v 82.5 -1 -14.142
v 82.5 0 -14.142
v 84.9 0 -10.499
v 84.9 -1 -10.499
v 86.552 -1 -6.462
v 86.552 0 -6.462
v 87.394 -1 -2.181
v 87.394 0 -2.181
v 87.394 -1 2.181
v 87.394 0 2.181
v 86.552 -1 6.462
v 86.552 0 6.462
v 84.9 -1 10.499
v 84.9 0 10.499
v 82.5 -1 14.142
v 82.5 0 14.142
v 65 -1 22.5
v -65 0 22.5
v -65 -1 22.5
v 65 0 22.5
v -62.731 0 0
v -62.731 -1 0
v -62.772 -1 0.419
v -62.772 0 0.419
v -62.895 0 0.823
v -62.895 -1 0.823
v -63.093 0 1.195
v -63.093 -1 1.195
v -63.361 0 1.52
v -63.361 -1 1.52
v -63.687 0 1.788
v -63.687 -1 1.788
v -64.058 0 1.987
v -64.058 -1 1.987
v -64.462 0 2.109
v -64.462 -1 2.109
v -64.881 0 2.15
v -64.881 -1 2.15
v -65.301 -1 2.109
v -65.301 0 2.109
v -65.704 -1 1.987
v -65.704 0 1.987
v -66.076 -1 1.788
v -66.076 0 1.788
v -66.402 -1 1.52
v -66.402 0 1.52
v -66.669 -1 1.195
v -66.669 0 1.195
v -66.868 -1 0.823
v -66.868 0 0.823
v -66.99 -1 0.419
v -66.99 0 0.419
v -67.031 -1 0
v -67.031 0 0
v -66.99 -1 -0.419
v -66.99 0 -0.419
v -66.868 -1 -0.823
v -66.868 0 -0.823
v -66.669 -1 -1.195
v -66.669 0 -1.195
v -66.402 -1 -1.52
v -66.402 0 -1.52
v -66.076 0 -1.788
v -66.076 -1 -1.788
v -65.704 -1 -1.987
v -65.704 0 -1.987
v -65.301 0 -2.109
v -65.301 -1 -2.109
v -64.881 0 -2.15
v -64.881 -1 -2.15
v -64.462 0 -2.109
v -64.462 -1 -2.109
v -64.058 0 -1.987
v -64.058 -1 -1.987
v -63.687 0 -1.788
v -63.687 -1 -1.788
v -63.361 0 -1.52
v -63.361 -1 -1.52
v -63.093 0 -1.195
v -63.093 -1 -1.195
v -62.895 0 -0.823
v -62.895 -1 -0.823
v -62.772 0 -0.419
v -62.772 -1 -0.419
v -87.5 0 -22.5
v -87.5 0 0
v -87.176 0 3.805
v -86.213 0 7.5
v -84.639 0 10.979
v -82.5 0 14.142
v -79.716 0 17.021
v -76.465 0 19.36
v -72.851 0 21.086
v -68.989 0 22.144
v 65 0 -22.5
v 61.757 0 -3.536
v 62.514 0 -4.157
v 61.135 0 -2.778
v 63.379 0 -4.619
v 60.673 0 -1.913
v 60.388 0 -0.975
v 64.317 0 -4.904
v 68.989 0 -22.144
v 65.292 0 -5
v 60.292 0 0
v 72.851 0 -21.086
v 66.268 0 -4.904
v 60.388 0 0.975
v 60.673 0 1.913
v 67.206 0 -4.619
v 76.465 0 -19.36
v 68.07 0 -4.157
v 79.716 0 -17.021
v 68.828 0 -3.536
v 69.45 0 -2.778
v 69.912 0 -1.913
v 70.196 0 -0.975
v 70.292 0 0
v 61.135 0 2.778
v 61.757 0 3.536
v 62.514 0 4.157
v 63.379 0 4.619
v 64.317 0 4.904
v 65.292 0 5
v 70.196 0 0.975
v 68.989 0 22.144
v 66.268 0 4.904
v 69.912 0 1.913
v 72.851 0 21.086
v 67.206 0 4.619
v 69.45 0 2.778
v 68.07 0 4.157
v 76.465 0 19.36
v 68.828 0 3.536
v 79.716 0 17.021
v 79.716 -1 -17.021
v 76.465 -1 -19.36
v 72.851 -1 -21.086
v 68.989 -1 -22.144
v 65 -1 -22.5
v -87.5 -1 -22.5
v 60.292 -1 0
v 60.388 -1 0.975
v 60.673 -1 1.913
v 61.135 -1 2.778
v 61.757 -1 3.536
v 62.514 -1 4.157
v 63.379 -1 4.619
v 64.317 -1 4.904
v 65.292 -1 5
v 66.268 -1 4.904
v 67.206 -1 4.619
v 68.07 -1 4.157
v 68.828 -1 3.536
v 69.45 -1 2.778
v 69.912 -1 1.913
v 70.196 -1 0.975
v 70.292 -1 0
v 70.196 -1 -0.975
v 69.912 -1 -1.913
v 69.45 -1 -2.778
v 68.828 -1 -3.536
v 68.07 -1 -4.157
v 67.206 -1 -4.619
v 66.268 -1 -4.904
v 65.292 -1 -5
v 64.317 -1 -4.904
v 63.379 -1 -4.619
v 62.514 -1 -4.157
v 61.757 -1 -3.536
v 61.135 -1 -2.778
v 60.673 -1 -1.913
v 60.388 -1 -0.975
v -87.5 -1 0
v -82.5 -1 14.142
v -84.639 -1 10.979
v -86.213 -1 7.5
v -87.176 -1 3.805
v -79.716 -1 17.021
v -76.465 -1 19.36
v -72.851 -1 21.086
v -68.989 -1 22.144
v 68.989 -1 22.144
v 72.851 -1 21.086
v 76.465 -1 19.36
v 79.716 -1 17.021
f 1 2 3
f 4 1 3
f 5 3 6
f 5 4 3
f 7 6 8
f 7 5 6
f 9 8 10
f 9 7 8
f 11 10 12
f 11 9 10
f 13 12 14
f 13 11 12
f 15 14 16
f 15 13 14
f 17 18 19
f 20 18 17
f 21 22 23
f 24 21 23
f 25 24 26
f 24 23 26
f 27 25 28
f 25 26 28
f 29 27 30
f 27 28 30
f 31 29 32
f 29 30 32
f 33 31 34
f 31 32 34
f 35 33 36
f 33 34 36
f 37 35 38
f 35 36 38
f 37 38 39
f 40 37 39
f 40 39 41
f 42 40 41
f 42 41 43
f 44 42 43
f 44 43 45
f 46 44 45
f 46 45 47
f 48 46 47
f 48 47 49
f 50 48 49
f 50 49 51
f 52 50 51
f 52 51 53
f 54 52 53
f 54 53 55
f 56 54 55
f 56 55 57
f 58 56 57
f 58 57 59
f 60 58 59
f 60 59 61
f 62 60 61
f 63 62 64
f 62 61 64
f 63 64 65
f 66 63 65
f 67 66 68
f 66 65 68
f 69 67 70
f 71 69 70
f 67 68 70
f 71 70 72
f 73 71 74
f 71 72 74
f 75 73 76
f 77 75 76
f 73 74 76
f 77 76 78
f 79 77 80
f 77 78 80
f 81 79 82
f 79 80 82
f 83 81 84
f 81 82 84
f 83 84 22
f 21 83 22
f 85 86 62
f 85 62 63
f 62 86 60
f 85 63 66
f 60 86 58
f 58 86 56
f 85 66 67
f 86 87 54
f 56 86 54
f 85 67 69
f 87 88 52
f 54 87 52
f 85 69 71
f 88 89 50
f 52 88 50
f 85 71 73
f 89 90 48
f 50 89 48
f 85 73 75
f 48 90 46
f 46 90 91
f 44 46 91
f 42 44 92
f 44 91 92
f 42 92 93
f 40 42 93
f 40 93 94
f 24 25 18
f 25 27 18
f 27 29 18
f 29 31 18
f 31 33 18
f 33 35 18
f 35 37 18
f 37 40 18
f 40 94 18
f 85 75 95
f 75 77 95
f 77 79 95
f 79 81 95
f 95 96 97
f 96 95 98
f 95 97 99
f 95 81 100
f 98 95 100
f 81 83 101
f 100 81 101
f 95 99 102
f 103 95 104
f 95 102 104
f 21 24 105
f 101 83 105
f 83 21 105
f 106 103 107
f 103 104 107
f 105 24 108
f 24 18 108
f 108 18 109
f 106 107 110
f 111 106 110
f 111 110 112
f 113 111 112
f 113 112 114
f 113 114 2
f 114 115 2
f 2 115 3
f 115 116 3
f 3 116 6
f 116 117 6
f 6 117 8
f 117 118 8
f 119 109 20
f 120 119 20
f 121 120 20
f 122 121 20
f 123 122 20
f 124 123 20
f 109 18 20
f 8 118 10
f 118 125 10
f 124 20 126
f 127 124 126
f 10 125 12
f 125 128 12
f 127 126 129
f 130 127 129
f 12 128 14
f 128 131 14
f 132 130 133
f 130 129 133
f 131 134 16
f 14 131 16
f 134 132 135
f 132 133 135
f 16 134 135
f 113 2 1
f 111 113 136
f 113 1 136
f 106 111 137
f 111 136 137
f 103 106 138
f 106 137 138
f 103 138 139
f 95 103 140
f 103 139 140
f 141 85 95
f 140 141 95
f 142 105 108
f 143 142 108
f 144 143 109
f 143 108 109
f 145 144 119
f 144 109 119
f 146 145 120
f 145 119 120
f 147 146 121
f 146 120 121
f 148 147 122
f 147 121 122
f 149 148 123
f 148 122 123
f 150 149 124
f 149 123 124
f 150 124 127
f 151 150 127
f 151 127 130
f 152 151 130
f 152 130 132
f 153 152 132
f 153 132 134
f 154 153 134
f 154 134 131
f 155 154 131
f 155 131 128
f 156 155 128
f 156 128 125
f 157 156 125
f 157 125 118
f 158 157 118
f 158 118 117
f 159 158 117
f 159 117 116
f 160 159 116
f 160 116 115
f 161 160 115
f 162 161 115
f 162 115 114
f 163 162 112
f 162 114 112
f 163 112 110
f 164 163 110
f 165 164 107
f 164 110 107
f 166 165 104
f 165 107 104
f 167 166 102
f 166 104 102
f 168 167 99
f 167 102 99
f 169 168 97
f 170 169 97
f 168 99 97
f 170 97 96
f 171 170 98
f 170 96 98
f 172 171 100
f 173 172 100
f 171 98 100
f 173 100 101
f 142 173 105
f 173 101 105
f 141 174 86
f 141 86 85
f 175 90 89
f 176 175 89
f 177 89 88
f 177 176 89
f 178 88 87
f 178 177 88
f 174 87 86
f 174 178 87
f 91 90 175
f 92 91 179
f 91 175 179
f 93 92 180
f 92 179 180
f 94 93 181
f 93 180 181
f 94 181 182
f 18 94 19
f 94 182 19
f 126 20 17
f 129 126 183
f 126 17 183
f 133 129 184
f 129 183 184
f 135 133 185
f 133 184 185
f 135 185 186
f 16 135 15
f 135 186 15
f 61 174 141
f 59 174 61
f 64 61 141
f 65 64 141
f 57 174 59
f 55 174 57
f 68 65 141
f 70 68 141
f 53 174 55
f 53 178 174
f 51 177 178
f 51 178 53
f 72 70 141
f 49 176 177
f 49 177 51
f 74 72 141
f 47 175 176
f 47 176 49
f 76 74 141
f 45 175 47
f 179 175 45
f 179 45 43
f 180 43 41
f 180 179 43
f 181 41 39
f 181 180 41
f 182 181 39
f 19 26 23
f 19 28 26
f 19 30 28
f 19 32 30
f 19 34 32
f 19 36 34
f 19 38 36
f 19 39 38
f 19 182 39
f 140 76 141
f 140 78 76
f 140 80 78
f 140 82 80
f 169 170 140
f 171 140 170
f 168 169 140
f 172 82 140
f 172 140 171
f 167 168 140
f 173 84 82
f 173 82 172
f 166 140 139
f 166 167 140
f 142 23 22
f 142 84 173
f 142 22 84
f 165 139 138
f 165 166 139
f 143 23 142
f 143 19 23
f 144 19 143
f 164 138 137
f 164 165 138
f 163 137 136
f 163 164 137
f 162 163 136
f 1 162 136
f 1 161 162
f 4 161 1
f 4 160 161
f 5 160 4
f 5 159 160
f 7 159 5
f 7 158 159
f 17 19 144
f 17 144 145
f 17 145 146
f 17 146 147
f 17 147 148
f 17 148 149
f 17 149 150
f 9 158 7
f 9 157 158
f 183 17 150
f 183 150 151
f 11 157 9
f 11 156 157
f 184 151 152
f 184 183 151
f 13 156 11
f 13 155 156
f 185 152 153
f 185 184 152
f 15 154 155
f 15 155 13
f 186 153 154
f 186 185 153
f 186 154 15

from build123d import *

# Parameters (mm, degrees)
F0_W      = 165
F0_H      = 45
F0_R      = 12.5
F1_DEPTH  = 1
F3_DEPTH  = 1
F4_DEPTH  = 25
F5_DEPTH  = 25
F8_DEPTH  = 1
F9_W      = 35.9933748841
F9_H      = 31.3726086169
F9_W_2    = 33.6829945445
F9_H_2    = 28.8190245628
F10_DEPTH = 1
F11_R     = 4.1249872097
F12_DEPTH = 25
F13_R     = 2.1502393586
F14_DEPTH = 25
F15_R     = 5
F16_DEPTH = 25


with BuildPart() as f1:
    # F0 (on Front) → F1 (new body)
    with BuildSketch(Plane.XZ):
        Rectangle(F0_W, F0_H)
        with Locations((-65, 0)):
            Circle(F0_R, mode=Mode.SUBTRACT)
        with Locations((65, 0)):
            Circle(F0_R, mode=Mode.SUBTRACT)
    extrude(amount=F1_DEPTH)

    # F2 (on face) → F3 (join)
    with BuildSketch(Plane.XZ.offset(1)):
        with BuildLine():
            Line((68.3925151825, -19.0988145769), (65, -22.5))
            ThreePointArc((65, -22.5), (87.5, 0), (65, 22.5))
            Line((65, 22.5), (71.474224329, 16.2770561874))
            Line((71.474224329, 16.2770561874), (77.4062722921, 9.1145541519))
            Line((77.4062722921, 9.1145541519), (80.3926512599, 2.1407562308))
            Line((80.3926512599, 2.1407562308), (80.3926512599, -5.2317115478))
            Line((80.3926512599, -5.2317115478), (78.3914923668, -12.1520543471))
            Line((78.3914923668, -12.1520543471), (74.6632069349, -14.4081749022))
            Line((74.6632069349, -14.4081749022), (68.3925151825, -19.0988145769))
        make_face()
        with BuildLine():
            Line((-65, 14.9617949501), (-65, 22.5))
            ThreePointArc((-65, 22.5), (-87.5, 0), (-65, -22.5))
            Line((-65, -22.5), (-67.4760043621, -15.6979020685))
            Line((-67.4760043621, -15.6979020685), (-72.8440880775, -12.9142012447))
            Line((-72.8440880775, -12.9142012447), (-76.5851810575, -7.8018400818))
            Line((-76.5851810575, -7.8018400818), (-79.5639529824, 0))
            Line((-79.5639529824, 0), (-79.5639529824, 6.4657721668))
            Line((-79.5639529824, 6.4657721668), (-75.4495188594, 11.7608513683))
            Line((-75.4495188594, 11.7608513683), (-65, 14.9617949501))
        make_face()
    extrude(amount=-F3_DEPTH)

    # F2 (on face) → F4 (cut)
    with BuildSketch(Plane.XZ.offset(1)):
        with BuildLine():
            Line((-82.5, 22.5), (-82.5, 14.1421356237))
            ThreePointArc((-82.5, 14.1421356237), (-74.6966991411, 20.3033008589), (-65, 22.5))
            Line((-65, 22.5), (-82.5, 22.5))
        make_face()
    extrude(amount=-F4_DEPTH, mode=Mode.SUBTRACT)

    # F2 (on face) → F5 (cut)
    with BuildSketch(Plane.XZ.offset(1)):
        with BuildLine():
            ThreePointArc((82.5, -14.1421356237), (74.6966991411, -20.3033008589), (65, -22.5))
            Line((65, -22.5), (82.5, -22.5))
            Line((82.5, -22.5), (82.5, -14.1421356237))
        make_face()
        with BuildLine():
            ThreePointArc((65, 22.5), (74.6966991411, 20.3033008589), (82.5, 14.1421356237))
            Line((82.5, 14.1421356237), (82.5, 22.5))
            Line((82.5, 22.5), (65, 22.5))
        make_face()
        with BuildLine():
            Line((-82.5, -22.5), (-65, -22.5))
            ThreePointArc((-65, -22.5), (-74.6966991411, -20.3033008589), (-82.5, -14.1421356237))
            Line((-82.5, -14.1421356237), (-82.5, -22.5))
        make_face()
    extrude(amount=-F5_DEPTH, mode=Mode.SUBTRACT)

    # F7 (on face) → F8 (join)
    with BuildSketch(Plane.XZ.offset(1)):
        Polygon((-81.9395110011, 0), (-87.5, 0), (-87.5, -22.5), (-65, -22.5), (-65, -18.5897927731), (-73.3228996396, -16.0001199692), (-80.1934376359, -9.6208481118), align=None)
    extrude(amount=-F8_DEPTH)

    # F9 (on face) → F10 (join)
    with BuildSketch(Plane.XZ.offset(1)):
        with Locations((-60.8671866357, 0.5391770974)):
            Rectangle(F9_W, F9_H)
        with Locations((63.7112520635, 0.1135794446)):
            Rectangle(F9_W_2, F9_H_2)
    extrude(amount=-F10_DEPTH)

    # F11 (on face) → F12 (cut)
    with BuildSketch(Plane.XZ.offset(1)):
        with Locations((65.292224288, 0)):
            Circle(F11_R)
    extrude(amount=-F12_DEPTH, mode=Mode.SUBTRACT)

    # F13 (on face) → F14 (cut)
    with BuildSketch(Plane.XZ.offset(1)):
        with Locations((-64.8811534047, 0)):
            Circle(F13_R)
    extrude(amount=-F14_DEPTH, mode=Mode.SUBTRACT)

    # F15 (on face) → F16 (cut)
    with BuildSketch(Plane(origin=(0, 0, 0), x_dir=(-1, 0, 0), z_dir=(0, 1, 0))):
        with Locations((-65.292224288, 0)):
            Circle(F15_R)
    extrude(amount=-F16_DEPTH, mode=Mode.SUBTRACT)


solid = f1.part
